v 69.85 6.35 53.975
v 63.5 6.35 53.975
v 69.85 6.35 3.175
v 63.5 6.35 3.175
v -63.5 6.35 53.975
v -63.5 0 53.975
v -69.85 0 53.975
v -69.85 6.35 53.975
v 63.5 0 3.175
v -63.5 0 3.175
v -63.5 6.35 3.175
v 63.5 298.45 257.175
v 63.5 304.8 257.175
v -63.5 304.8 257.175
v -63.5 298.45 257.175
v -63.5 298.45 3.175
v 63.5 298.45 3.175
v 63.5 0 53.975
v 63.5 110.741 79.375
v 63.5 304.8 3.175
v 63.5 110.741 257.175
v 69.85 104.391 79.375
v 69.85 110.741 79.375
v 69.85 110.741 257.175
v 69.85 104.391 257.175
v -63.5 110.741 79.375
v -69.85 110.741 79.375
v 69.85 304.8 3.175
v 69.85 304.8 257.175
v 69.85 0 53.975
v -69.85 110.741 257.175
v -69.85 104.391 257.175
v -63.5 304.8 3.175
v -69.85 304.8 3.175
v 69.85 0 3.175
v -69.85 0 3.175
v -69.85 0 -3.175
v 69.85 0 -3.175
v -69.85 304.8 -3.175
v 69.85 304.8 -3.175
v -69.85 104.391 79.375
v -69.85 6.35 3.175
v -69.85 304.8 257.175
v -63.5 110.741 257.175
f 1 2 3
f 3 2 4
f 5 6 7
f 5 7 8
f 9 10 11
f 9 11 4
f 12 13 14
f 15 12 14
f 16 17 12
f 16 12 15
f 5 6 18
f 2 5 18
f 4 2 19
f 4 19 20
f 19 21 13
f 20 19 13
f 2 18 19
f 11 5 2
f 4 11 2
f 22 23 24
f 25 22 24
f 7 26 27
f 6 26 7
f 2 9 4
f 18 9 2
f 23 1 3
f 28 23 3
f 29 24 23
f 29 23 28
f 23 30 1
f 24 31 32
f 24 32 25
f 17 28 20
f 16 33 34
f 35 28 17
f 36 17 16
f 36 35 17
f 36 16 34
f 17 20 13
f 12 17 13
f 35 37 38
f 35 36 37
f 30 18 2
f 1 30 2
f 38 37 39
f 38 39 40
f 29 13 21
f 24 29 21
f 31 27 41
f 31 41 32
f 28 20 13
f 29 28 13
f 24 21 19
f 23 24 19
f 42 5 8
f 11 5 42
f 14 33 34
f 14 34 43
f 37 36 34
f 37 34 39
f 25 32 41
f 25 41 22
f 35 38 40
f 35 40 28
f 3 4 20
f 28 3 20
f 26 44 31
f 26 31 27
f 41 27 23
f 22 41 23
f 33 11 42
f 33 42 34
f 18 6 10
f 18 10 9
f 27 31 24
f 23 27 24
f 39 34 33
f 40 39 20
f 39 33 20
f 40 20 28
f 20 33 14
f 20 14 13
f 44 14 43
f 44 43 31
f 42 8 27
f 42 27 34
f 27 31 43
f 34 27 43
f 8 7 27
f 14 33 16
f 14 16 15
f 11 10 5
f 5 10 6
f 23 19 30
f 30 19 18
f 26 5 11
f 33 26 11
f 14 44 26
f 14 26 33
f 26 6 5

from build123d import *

# Parameters (mm, degrees)
F1_DEPTH  = 304.8
F0_W      = 127
F0_H      = 50.8
F2_DEPTH  = 6.35
F3_W      = 127
F3_H      = 254
F4_DEPTH  = 6.35
F7_DEPTH  = 6.35
F9_W      = 139.7
F9_H      = 177.8
F10_DEPTH = 6.35


with BuildPart() as f1:
    # F0 (on Front) → F1 (new body)
    with BuildSketch(Plane.XZ):
        Polygon((-69.85, -3.175), (69.85, -3.175), (69.85, 3.175), (63.5, 3.175), (-63.5, 3.175), (-69.85, 3.175), align=None)
    extrude(amount=-F1_DEPTH)

    # F3 (on face) → F4 (join)
    with BuildSketch(Plane(origin=(0, 304.8, 0), x_dir=(-1, 0, 0), z_dir=(0, 1, 0))):
        with Locations((0, 130.175)):
            Rectangle(F3_W, F3_H)
    extrude(amount=-F4_DEPTH)


with BuildPart() as f2:
    # F0 (on Front) → F2 (new body)
    with BuildSketch(Plane.XZ):
        with Locations((0, 28.575)):
            Rectangle(F0_W, F0_H)
    extrude(amount=-F2_DEPTH)


with BuildPart() as f7:
    # F6 (on offset) → F7 (new body)
    with BuildSketch(Plane.YZ.offset(63.5)):
        Polygon((6.35, 53.975), (6.35, 3.175), (298.45, 3.175), (304.8, 3.175), (304.8, 257.175), (298.45, 257.175), (110.740557, 257.175), (110.740557, 79.375), (0, 53.975), align=None)
    extrude(amount=F7_DEPTH)


with BuildPart() as f8_1:
    # F8: instance of F7
    add(f7.part.mirror(Plane.YZ))


with BuildPart() as f10:
    # F9 (on face) → F10 (new body)
    with BuildSketch(Plane.XZ.offset(-110.740557)):
        with Locations((0, 168.275)):
            Rectangle(F9_W, F9_H)
    extrude(amount=F10_DEPTH)


solid = Compound([f1.part, f2.part, f7.part, f8_1.part, f10.part])
